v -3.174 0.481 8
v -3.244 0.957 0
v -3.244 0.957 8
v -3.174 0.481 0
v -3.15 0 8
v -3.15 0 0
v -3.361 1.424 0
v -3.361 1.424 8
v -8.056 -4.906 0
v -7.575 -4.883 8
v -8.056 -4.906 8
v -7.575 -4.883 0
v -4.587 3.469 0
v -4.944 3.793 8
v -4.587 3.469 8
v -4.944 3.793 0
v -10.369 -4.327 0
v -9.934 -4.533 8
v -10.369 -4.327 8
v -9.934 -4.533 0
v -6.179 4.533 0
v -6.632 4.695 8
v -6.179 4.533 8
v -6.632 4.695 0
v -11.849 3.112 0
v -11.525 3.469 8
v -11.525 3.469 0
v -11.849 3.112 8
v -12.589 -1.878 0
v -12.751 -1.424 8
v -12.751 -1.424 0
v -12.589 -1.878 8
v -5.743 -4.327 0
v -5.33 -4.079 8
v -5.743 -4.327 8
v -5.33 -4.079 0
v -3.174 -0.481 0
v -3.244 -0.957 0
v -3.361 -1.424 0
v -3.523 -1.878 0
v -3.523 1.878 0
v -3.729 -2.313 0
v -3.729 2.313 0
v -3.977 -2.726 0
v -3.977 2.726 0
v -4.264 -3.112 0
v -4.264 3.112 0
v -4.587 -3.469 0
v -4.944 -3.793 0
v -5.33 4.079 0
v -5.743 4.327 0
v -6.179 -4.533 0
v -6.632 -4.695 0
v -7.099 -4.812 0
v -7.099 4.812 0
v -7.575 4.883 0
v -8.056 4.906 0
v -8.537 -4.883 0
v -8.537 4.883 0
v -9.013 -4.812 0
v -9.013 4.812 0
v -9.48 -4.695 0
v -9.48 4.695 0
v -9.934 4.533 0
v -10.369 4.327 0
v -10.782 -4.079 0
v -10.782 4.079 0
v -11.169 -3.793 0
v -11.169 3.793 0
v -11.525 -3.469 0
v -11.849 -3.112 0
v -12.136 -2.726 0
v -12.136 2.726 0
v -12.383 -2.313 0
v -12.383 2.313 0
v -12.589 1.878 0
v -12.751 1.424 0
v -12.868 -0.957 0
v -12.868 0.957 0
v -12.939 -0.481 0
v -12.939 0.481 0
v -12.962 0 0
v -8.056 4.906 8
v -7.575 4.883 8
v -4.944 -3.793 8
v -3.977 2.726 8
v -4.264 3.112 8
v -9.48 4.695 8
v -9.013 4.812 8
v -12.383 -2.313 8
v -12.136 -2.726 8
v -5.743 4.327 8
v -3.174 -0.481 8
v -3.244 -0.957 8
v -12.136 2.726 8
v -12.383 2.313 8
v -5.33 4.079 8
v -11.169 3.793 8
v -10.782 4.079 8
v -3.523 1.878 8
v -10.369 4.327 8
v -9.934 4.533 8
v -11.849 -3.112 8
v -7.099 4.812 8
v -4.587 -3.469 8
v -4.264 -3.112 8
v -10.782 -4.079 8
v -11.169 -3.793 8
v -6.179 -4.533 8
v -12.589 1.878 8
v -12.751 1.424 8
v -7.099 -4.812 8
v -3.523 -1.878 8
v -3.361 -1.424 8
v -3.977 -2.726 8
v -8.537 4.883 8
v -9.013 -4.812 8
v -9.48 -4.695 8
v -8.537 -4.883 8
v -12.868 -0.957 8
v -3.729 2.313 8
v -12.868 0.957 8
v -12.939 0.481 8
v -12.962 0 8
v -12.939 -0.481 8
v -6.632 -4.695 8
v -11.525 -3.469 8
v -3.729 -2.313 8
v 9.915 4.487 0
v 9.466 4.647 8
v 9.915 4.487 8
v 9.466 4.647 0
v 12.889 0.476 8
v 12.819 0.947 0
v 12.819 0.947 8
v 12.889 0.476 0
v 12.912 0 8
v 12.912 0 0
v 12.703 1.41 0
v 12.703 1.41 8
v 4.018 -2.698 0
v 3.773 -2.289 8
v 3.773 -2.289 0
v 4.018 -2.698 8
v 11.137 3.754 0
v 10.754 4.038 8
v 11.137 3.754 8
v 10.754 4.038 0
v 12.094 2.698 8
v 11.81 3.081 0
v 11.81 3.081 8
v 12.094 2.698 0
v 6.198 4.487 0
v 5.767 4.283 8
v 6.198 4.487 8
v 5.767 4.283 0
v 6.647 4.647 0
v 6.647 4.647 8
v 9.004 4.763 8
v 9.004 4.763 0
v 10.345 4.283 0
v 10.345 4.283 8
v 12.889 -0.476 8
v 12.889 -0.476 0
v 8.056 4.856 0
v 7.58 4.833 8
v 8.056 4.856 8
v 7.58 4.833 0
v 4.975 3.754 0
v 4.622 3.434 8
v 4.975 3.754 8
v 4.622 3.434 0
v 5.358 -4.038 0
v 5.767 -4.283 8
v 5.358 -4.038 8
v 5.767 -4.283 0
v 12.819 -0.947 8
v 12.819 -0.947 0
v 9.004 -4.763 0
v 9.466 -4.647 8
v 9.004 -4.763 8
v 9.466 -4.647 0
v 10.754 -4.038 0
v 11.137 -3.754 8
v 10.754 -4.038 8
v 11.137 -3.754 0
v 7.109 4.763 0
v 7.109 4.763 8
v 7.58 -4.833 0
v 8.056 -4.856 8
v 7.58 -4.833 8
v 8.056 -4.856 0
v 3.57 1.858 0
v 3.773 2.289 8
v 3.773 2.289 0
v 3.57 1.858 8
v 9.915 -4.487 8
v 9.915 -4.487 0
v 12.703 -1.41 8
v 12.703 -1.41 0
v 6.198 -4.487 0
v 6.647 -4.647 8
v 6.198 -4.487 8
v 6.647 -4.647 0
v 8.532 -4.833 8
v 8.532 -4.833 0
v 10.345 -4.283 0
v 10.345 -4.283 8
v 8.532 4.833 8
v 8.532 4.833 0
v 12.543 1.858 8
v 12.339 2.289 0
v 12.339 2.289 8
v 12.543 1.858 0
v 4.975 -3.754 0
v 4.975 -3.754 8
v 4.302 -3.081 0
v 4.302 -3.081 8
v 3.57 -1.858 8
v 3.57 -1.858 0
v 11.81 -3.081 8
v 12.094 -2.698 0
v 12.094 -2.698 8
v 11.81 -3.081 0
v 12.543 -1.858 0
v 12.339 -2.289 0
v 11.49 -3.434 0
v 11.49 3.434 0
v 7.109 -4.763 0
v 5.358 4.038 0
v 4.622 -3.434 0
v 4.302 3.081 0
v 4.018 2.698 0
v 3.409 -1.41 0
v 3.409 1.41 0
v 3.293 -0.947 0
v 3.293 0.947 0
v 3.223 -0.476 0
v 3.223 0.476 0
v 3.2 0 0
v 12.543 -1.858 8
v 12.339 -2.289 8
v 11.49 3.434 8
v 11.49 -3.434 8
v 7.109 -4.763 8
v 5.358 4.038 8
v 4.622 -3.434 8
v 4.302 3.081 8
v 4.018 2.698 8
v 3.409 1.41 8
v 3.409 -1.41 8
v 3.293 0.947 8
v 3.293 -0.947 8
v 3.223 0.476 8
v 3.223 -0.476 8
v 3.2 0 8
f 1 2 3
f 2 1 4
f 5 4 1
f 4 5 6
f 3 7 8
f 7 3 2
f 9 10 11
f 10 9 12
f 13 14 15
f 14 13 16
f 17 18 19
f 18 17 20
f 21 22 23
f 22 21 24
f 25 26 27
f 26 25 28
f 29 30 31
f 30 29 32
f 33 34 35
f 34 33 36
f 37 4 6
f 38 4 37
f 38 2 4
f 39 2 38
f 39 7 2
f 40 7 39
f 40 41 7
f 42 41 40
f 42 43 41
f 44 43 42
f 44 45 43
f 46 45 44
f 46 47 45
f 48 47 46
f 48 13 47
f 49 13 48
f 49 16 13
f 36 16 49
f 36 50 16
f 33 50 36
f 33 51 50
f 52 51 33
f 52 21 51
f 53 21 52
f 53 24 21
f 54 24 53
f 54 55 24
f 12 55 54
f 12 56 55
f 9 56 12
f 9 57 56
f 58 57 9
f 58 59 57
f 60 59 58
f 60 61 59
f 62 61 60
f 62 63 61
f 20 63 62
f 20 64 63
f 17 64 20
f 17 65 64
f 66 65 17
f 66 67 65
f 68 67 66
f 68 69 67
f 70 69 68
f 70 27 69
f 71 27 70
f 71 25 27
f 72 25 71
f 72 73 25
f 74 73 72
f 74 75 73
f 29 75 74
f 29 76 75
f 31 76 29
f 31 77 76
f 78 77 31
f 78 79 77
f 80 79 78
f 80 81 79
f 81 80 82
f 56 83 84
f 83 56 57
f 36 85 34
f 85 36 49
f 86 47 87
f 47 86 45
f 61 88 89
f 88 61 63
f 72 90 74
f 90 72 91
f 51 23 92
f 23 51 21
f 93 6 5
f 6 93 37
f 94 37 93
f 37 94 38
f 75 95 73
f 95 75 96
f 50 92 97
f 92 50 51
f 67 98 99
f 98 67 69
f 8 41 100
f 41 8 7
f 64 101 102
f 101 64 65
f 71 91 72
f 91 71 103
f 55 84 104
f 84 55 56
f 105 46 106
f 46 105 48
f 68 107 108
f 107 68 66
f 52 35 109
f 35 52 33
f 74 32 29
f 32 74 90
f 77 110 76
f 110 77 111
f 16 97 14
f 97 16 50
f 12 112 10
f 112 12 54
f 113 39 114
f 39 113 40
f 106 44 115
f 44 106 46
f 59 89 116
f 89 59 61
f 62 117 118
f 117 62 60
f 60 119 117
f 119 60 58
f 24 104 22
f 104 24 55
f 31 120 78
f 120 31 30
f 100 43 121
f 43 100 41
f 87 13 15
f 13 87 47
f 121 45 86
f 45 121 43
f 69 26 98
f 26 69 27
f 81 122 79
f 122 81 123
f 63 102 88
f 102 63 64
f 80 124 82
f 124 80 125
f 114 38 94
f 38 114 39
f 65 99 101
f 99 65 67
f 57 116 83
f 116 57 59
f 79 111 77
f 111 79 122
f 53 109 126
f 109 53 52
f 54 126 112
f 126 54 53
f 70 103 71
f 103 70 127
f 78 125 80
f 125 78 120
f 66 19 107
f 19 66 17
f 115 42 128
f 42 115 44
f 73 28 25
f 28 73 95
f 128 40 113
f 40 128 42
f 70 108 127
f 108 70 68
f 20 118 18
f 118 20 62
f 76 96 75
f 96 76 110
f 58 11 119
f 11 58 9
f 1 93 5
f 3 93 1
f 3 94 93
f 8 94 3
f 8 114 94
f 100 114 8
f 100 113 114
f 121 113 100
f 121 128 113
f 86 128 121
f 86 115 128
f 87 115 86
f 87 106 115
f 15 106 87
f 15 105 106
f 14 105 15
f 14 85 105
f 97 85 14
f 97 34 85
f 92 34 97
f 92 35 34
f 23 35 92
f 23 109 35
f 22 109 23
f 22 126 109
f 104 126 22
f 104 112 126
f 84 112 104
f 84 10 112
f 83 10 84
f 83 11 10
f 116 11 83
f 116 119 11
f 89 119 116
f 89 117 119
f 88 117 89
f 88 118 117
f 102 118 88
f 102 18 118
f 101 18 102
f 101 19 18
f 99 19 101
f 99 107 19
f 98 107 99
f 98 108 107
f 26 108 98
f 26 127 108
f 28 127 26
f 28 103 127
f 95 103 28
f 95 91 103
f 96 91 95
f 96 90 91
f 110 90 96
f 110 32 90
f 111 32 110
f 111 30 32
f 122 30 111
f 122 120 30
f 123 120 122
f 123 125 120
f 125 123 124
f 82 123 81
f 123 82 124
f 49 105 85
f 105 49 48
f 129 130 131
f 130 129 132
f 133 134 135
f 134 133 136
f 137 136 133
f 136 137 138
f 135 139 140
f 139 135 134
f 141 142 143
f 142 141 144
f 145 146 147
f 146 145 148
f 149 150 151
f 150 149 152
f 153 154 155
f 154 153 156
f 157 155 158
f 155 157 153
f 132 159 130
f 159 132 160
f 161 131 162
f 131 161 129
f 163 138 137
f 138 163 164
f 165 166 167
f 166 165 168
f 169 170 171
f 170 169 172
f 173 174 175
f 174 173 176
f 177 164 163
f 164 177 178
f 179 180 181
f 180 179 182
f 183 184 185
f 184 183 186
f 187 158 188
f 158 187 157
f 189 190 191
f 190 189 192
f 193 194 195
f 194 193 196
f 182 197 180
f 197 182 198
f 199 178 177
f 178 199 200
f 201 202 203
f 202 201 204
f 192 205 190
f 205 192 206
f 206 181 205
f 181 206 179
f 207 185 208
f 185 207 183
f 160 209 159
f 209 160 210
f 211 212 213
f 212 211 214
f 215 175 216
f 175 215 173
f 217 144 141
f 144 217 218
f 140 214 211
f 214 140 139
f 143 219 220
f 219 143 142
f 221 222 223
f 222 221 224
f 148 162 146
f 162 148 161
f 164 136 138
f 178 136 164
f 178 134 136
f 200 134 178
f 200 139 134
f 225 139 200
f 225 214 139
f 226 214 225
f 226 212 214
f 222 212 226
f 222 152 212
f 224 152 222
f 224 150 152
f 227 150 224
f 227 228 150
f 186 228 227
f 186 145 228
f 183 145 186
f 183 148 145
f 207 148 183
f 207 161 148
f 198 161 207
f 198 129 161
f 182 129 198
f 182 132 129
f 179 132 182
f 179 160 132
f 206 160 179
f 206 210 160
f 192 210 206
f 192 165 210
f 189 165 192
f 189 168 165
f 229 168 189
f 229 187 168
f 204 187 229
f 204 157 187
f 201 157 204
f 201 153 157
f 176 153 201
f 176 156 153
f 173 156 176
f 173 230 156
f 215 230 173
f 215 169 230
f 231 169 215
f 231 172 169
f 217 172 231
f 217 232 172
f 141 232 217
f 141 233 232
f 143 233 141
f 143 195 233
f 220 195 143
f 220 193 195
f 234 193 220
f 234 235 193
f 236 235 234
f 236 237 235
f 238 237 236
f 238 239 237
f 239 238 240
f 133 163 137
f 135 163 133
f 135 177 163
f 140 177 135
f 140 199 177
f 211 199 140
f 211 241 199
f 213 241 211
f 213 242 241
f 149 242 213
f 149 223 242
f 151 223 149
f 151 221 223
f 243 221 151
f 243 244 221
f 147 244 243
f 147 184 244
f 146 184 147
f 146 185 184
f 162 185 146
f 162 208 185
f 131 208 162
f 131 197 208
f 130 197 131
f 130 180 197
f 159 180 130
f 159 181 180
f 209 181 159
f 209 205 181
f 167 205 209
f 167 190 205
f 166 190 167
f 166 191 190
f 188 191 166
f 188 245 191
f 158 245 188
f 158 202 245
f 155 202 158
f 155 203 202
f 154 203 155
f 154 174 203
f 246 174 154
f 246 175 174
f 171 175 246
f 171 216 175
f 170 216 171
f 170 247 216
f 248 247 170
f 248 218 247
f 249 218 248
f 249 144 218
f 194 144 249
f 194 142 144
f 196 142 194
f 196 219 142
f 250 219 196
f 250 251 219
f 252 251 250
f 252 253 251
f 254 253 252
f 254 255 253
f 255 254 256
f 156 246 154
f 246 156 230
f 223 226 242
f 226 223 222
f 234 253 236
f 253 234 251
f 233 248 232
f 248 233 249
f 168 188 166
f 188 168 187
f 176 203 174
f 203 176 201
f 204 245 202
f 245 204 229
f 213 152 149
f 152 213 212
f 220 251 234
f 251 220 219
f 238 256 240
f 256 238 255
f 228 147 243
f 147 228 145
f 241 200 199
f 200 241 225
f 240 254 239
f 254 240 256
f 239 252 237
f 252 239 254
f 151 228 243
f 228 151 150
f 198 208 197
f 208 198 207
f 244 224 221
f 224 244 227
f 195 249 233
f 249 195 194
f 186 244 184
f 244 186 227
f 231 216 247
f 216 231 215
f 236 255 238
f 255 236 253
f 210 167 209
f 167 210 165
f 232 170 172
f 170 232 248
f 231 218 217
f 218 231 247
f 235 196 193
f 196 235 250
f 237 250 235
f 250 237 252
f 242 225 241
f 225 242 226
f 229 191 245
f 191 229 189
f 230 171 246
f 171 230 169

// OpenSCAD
// === PARAMETERS ===
drill_diameter = 11.1125;  // 7/16" in mm
pin_height = 8;
clearance_a = 1.3;
clearance_b = 1.4;
spacing = 5;  // Gap between pins

// === DERIVED ===
pin_diameter_a = drill_diameter - clearance_a;
pin_diameter_b = drill_diameter - clearance_b;

// === MODULES ===
module pin(d, h=pin_height) {
    cylinder(d=d, h=h, $fn=64);
}

// === RENDER ===
// Pin A: 0.3mm clearance (10.81mm diameter)
translate([-(drill_diameter/2 + spacing/2), 0, 0])
    pin(d=pin_diameter_a);

// Pin B: 0.4mm clearance (10.71mm diameter)
translate([(drill_diameter/2 + spacing/2), 0, 0])
    pin(d=pin_diameter_b);
